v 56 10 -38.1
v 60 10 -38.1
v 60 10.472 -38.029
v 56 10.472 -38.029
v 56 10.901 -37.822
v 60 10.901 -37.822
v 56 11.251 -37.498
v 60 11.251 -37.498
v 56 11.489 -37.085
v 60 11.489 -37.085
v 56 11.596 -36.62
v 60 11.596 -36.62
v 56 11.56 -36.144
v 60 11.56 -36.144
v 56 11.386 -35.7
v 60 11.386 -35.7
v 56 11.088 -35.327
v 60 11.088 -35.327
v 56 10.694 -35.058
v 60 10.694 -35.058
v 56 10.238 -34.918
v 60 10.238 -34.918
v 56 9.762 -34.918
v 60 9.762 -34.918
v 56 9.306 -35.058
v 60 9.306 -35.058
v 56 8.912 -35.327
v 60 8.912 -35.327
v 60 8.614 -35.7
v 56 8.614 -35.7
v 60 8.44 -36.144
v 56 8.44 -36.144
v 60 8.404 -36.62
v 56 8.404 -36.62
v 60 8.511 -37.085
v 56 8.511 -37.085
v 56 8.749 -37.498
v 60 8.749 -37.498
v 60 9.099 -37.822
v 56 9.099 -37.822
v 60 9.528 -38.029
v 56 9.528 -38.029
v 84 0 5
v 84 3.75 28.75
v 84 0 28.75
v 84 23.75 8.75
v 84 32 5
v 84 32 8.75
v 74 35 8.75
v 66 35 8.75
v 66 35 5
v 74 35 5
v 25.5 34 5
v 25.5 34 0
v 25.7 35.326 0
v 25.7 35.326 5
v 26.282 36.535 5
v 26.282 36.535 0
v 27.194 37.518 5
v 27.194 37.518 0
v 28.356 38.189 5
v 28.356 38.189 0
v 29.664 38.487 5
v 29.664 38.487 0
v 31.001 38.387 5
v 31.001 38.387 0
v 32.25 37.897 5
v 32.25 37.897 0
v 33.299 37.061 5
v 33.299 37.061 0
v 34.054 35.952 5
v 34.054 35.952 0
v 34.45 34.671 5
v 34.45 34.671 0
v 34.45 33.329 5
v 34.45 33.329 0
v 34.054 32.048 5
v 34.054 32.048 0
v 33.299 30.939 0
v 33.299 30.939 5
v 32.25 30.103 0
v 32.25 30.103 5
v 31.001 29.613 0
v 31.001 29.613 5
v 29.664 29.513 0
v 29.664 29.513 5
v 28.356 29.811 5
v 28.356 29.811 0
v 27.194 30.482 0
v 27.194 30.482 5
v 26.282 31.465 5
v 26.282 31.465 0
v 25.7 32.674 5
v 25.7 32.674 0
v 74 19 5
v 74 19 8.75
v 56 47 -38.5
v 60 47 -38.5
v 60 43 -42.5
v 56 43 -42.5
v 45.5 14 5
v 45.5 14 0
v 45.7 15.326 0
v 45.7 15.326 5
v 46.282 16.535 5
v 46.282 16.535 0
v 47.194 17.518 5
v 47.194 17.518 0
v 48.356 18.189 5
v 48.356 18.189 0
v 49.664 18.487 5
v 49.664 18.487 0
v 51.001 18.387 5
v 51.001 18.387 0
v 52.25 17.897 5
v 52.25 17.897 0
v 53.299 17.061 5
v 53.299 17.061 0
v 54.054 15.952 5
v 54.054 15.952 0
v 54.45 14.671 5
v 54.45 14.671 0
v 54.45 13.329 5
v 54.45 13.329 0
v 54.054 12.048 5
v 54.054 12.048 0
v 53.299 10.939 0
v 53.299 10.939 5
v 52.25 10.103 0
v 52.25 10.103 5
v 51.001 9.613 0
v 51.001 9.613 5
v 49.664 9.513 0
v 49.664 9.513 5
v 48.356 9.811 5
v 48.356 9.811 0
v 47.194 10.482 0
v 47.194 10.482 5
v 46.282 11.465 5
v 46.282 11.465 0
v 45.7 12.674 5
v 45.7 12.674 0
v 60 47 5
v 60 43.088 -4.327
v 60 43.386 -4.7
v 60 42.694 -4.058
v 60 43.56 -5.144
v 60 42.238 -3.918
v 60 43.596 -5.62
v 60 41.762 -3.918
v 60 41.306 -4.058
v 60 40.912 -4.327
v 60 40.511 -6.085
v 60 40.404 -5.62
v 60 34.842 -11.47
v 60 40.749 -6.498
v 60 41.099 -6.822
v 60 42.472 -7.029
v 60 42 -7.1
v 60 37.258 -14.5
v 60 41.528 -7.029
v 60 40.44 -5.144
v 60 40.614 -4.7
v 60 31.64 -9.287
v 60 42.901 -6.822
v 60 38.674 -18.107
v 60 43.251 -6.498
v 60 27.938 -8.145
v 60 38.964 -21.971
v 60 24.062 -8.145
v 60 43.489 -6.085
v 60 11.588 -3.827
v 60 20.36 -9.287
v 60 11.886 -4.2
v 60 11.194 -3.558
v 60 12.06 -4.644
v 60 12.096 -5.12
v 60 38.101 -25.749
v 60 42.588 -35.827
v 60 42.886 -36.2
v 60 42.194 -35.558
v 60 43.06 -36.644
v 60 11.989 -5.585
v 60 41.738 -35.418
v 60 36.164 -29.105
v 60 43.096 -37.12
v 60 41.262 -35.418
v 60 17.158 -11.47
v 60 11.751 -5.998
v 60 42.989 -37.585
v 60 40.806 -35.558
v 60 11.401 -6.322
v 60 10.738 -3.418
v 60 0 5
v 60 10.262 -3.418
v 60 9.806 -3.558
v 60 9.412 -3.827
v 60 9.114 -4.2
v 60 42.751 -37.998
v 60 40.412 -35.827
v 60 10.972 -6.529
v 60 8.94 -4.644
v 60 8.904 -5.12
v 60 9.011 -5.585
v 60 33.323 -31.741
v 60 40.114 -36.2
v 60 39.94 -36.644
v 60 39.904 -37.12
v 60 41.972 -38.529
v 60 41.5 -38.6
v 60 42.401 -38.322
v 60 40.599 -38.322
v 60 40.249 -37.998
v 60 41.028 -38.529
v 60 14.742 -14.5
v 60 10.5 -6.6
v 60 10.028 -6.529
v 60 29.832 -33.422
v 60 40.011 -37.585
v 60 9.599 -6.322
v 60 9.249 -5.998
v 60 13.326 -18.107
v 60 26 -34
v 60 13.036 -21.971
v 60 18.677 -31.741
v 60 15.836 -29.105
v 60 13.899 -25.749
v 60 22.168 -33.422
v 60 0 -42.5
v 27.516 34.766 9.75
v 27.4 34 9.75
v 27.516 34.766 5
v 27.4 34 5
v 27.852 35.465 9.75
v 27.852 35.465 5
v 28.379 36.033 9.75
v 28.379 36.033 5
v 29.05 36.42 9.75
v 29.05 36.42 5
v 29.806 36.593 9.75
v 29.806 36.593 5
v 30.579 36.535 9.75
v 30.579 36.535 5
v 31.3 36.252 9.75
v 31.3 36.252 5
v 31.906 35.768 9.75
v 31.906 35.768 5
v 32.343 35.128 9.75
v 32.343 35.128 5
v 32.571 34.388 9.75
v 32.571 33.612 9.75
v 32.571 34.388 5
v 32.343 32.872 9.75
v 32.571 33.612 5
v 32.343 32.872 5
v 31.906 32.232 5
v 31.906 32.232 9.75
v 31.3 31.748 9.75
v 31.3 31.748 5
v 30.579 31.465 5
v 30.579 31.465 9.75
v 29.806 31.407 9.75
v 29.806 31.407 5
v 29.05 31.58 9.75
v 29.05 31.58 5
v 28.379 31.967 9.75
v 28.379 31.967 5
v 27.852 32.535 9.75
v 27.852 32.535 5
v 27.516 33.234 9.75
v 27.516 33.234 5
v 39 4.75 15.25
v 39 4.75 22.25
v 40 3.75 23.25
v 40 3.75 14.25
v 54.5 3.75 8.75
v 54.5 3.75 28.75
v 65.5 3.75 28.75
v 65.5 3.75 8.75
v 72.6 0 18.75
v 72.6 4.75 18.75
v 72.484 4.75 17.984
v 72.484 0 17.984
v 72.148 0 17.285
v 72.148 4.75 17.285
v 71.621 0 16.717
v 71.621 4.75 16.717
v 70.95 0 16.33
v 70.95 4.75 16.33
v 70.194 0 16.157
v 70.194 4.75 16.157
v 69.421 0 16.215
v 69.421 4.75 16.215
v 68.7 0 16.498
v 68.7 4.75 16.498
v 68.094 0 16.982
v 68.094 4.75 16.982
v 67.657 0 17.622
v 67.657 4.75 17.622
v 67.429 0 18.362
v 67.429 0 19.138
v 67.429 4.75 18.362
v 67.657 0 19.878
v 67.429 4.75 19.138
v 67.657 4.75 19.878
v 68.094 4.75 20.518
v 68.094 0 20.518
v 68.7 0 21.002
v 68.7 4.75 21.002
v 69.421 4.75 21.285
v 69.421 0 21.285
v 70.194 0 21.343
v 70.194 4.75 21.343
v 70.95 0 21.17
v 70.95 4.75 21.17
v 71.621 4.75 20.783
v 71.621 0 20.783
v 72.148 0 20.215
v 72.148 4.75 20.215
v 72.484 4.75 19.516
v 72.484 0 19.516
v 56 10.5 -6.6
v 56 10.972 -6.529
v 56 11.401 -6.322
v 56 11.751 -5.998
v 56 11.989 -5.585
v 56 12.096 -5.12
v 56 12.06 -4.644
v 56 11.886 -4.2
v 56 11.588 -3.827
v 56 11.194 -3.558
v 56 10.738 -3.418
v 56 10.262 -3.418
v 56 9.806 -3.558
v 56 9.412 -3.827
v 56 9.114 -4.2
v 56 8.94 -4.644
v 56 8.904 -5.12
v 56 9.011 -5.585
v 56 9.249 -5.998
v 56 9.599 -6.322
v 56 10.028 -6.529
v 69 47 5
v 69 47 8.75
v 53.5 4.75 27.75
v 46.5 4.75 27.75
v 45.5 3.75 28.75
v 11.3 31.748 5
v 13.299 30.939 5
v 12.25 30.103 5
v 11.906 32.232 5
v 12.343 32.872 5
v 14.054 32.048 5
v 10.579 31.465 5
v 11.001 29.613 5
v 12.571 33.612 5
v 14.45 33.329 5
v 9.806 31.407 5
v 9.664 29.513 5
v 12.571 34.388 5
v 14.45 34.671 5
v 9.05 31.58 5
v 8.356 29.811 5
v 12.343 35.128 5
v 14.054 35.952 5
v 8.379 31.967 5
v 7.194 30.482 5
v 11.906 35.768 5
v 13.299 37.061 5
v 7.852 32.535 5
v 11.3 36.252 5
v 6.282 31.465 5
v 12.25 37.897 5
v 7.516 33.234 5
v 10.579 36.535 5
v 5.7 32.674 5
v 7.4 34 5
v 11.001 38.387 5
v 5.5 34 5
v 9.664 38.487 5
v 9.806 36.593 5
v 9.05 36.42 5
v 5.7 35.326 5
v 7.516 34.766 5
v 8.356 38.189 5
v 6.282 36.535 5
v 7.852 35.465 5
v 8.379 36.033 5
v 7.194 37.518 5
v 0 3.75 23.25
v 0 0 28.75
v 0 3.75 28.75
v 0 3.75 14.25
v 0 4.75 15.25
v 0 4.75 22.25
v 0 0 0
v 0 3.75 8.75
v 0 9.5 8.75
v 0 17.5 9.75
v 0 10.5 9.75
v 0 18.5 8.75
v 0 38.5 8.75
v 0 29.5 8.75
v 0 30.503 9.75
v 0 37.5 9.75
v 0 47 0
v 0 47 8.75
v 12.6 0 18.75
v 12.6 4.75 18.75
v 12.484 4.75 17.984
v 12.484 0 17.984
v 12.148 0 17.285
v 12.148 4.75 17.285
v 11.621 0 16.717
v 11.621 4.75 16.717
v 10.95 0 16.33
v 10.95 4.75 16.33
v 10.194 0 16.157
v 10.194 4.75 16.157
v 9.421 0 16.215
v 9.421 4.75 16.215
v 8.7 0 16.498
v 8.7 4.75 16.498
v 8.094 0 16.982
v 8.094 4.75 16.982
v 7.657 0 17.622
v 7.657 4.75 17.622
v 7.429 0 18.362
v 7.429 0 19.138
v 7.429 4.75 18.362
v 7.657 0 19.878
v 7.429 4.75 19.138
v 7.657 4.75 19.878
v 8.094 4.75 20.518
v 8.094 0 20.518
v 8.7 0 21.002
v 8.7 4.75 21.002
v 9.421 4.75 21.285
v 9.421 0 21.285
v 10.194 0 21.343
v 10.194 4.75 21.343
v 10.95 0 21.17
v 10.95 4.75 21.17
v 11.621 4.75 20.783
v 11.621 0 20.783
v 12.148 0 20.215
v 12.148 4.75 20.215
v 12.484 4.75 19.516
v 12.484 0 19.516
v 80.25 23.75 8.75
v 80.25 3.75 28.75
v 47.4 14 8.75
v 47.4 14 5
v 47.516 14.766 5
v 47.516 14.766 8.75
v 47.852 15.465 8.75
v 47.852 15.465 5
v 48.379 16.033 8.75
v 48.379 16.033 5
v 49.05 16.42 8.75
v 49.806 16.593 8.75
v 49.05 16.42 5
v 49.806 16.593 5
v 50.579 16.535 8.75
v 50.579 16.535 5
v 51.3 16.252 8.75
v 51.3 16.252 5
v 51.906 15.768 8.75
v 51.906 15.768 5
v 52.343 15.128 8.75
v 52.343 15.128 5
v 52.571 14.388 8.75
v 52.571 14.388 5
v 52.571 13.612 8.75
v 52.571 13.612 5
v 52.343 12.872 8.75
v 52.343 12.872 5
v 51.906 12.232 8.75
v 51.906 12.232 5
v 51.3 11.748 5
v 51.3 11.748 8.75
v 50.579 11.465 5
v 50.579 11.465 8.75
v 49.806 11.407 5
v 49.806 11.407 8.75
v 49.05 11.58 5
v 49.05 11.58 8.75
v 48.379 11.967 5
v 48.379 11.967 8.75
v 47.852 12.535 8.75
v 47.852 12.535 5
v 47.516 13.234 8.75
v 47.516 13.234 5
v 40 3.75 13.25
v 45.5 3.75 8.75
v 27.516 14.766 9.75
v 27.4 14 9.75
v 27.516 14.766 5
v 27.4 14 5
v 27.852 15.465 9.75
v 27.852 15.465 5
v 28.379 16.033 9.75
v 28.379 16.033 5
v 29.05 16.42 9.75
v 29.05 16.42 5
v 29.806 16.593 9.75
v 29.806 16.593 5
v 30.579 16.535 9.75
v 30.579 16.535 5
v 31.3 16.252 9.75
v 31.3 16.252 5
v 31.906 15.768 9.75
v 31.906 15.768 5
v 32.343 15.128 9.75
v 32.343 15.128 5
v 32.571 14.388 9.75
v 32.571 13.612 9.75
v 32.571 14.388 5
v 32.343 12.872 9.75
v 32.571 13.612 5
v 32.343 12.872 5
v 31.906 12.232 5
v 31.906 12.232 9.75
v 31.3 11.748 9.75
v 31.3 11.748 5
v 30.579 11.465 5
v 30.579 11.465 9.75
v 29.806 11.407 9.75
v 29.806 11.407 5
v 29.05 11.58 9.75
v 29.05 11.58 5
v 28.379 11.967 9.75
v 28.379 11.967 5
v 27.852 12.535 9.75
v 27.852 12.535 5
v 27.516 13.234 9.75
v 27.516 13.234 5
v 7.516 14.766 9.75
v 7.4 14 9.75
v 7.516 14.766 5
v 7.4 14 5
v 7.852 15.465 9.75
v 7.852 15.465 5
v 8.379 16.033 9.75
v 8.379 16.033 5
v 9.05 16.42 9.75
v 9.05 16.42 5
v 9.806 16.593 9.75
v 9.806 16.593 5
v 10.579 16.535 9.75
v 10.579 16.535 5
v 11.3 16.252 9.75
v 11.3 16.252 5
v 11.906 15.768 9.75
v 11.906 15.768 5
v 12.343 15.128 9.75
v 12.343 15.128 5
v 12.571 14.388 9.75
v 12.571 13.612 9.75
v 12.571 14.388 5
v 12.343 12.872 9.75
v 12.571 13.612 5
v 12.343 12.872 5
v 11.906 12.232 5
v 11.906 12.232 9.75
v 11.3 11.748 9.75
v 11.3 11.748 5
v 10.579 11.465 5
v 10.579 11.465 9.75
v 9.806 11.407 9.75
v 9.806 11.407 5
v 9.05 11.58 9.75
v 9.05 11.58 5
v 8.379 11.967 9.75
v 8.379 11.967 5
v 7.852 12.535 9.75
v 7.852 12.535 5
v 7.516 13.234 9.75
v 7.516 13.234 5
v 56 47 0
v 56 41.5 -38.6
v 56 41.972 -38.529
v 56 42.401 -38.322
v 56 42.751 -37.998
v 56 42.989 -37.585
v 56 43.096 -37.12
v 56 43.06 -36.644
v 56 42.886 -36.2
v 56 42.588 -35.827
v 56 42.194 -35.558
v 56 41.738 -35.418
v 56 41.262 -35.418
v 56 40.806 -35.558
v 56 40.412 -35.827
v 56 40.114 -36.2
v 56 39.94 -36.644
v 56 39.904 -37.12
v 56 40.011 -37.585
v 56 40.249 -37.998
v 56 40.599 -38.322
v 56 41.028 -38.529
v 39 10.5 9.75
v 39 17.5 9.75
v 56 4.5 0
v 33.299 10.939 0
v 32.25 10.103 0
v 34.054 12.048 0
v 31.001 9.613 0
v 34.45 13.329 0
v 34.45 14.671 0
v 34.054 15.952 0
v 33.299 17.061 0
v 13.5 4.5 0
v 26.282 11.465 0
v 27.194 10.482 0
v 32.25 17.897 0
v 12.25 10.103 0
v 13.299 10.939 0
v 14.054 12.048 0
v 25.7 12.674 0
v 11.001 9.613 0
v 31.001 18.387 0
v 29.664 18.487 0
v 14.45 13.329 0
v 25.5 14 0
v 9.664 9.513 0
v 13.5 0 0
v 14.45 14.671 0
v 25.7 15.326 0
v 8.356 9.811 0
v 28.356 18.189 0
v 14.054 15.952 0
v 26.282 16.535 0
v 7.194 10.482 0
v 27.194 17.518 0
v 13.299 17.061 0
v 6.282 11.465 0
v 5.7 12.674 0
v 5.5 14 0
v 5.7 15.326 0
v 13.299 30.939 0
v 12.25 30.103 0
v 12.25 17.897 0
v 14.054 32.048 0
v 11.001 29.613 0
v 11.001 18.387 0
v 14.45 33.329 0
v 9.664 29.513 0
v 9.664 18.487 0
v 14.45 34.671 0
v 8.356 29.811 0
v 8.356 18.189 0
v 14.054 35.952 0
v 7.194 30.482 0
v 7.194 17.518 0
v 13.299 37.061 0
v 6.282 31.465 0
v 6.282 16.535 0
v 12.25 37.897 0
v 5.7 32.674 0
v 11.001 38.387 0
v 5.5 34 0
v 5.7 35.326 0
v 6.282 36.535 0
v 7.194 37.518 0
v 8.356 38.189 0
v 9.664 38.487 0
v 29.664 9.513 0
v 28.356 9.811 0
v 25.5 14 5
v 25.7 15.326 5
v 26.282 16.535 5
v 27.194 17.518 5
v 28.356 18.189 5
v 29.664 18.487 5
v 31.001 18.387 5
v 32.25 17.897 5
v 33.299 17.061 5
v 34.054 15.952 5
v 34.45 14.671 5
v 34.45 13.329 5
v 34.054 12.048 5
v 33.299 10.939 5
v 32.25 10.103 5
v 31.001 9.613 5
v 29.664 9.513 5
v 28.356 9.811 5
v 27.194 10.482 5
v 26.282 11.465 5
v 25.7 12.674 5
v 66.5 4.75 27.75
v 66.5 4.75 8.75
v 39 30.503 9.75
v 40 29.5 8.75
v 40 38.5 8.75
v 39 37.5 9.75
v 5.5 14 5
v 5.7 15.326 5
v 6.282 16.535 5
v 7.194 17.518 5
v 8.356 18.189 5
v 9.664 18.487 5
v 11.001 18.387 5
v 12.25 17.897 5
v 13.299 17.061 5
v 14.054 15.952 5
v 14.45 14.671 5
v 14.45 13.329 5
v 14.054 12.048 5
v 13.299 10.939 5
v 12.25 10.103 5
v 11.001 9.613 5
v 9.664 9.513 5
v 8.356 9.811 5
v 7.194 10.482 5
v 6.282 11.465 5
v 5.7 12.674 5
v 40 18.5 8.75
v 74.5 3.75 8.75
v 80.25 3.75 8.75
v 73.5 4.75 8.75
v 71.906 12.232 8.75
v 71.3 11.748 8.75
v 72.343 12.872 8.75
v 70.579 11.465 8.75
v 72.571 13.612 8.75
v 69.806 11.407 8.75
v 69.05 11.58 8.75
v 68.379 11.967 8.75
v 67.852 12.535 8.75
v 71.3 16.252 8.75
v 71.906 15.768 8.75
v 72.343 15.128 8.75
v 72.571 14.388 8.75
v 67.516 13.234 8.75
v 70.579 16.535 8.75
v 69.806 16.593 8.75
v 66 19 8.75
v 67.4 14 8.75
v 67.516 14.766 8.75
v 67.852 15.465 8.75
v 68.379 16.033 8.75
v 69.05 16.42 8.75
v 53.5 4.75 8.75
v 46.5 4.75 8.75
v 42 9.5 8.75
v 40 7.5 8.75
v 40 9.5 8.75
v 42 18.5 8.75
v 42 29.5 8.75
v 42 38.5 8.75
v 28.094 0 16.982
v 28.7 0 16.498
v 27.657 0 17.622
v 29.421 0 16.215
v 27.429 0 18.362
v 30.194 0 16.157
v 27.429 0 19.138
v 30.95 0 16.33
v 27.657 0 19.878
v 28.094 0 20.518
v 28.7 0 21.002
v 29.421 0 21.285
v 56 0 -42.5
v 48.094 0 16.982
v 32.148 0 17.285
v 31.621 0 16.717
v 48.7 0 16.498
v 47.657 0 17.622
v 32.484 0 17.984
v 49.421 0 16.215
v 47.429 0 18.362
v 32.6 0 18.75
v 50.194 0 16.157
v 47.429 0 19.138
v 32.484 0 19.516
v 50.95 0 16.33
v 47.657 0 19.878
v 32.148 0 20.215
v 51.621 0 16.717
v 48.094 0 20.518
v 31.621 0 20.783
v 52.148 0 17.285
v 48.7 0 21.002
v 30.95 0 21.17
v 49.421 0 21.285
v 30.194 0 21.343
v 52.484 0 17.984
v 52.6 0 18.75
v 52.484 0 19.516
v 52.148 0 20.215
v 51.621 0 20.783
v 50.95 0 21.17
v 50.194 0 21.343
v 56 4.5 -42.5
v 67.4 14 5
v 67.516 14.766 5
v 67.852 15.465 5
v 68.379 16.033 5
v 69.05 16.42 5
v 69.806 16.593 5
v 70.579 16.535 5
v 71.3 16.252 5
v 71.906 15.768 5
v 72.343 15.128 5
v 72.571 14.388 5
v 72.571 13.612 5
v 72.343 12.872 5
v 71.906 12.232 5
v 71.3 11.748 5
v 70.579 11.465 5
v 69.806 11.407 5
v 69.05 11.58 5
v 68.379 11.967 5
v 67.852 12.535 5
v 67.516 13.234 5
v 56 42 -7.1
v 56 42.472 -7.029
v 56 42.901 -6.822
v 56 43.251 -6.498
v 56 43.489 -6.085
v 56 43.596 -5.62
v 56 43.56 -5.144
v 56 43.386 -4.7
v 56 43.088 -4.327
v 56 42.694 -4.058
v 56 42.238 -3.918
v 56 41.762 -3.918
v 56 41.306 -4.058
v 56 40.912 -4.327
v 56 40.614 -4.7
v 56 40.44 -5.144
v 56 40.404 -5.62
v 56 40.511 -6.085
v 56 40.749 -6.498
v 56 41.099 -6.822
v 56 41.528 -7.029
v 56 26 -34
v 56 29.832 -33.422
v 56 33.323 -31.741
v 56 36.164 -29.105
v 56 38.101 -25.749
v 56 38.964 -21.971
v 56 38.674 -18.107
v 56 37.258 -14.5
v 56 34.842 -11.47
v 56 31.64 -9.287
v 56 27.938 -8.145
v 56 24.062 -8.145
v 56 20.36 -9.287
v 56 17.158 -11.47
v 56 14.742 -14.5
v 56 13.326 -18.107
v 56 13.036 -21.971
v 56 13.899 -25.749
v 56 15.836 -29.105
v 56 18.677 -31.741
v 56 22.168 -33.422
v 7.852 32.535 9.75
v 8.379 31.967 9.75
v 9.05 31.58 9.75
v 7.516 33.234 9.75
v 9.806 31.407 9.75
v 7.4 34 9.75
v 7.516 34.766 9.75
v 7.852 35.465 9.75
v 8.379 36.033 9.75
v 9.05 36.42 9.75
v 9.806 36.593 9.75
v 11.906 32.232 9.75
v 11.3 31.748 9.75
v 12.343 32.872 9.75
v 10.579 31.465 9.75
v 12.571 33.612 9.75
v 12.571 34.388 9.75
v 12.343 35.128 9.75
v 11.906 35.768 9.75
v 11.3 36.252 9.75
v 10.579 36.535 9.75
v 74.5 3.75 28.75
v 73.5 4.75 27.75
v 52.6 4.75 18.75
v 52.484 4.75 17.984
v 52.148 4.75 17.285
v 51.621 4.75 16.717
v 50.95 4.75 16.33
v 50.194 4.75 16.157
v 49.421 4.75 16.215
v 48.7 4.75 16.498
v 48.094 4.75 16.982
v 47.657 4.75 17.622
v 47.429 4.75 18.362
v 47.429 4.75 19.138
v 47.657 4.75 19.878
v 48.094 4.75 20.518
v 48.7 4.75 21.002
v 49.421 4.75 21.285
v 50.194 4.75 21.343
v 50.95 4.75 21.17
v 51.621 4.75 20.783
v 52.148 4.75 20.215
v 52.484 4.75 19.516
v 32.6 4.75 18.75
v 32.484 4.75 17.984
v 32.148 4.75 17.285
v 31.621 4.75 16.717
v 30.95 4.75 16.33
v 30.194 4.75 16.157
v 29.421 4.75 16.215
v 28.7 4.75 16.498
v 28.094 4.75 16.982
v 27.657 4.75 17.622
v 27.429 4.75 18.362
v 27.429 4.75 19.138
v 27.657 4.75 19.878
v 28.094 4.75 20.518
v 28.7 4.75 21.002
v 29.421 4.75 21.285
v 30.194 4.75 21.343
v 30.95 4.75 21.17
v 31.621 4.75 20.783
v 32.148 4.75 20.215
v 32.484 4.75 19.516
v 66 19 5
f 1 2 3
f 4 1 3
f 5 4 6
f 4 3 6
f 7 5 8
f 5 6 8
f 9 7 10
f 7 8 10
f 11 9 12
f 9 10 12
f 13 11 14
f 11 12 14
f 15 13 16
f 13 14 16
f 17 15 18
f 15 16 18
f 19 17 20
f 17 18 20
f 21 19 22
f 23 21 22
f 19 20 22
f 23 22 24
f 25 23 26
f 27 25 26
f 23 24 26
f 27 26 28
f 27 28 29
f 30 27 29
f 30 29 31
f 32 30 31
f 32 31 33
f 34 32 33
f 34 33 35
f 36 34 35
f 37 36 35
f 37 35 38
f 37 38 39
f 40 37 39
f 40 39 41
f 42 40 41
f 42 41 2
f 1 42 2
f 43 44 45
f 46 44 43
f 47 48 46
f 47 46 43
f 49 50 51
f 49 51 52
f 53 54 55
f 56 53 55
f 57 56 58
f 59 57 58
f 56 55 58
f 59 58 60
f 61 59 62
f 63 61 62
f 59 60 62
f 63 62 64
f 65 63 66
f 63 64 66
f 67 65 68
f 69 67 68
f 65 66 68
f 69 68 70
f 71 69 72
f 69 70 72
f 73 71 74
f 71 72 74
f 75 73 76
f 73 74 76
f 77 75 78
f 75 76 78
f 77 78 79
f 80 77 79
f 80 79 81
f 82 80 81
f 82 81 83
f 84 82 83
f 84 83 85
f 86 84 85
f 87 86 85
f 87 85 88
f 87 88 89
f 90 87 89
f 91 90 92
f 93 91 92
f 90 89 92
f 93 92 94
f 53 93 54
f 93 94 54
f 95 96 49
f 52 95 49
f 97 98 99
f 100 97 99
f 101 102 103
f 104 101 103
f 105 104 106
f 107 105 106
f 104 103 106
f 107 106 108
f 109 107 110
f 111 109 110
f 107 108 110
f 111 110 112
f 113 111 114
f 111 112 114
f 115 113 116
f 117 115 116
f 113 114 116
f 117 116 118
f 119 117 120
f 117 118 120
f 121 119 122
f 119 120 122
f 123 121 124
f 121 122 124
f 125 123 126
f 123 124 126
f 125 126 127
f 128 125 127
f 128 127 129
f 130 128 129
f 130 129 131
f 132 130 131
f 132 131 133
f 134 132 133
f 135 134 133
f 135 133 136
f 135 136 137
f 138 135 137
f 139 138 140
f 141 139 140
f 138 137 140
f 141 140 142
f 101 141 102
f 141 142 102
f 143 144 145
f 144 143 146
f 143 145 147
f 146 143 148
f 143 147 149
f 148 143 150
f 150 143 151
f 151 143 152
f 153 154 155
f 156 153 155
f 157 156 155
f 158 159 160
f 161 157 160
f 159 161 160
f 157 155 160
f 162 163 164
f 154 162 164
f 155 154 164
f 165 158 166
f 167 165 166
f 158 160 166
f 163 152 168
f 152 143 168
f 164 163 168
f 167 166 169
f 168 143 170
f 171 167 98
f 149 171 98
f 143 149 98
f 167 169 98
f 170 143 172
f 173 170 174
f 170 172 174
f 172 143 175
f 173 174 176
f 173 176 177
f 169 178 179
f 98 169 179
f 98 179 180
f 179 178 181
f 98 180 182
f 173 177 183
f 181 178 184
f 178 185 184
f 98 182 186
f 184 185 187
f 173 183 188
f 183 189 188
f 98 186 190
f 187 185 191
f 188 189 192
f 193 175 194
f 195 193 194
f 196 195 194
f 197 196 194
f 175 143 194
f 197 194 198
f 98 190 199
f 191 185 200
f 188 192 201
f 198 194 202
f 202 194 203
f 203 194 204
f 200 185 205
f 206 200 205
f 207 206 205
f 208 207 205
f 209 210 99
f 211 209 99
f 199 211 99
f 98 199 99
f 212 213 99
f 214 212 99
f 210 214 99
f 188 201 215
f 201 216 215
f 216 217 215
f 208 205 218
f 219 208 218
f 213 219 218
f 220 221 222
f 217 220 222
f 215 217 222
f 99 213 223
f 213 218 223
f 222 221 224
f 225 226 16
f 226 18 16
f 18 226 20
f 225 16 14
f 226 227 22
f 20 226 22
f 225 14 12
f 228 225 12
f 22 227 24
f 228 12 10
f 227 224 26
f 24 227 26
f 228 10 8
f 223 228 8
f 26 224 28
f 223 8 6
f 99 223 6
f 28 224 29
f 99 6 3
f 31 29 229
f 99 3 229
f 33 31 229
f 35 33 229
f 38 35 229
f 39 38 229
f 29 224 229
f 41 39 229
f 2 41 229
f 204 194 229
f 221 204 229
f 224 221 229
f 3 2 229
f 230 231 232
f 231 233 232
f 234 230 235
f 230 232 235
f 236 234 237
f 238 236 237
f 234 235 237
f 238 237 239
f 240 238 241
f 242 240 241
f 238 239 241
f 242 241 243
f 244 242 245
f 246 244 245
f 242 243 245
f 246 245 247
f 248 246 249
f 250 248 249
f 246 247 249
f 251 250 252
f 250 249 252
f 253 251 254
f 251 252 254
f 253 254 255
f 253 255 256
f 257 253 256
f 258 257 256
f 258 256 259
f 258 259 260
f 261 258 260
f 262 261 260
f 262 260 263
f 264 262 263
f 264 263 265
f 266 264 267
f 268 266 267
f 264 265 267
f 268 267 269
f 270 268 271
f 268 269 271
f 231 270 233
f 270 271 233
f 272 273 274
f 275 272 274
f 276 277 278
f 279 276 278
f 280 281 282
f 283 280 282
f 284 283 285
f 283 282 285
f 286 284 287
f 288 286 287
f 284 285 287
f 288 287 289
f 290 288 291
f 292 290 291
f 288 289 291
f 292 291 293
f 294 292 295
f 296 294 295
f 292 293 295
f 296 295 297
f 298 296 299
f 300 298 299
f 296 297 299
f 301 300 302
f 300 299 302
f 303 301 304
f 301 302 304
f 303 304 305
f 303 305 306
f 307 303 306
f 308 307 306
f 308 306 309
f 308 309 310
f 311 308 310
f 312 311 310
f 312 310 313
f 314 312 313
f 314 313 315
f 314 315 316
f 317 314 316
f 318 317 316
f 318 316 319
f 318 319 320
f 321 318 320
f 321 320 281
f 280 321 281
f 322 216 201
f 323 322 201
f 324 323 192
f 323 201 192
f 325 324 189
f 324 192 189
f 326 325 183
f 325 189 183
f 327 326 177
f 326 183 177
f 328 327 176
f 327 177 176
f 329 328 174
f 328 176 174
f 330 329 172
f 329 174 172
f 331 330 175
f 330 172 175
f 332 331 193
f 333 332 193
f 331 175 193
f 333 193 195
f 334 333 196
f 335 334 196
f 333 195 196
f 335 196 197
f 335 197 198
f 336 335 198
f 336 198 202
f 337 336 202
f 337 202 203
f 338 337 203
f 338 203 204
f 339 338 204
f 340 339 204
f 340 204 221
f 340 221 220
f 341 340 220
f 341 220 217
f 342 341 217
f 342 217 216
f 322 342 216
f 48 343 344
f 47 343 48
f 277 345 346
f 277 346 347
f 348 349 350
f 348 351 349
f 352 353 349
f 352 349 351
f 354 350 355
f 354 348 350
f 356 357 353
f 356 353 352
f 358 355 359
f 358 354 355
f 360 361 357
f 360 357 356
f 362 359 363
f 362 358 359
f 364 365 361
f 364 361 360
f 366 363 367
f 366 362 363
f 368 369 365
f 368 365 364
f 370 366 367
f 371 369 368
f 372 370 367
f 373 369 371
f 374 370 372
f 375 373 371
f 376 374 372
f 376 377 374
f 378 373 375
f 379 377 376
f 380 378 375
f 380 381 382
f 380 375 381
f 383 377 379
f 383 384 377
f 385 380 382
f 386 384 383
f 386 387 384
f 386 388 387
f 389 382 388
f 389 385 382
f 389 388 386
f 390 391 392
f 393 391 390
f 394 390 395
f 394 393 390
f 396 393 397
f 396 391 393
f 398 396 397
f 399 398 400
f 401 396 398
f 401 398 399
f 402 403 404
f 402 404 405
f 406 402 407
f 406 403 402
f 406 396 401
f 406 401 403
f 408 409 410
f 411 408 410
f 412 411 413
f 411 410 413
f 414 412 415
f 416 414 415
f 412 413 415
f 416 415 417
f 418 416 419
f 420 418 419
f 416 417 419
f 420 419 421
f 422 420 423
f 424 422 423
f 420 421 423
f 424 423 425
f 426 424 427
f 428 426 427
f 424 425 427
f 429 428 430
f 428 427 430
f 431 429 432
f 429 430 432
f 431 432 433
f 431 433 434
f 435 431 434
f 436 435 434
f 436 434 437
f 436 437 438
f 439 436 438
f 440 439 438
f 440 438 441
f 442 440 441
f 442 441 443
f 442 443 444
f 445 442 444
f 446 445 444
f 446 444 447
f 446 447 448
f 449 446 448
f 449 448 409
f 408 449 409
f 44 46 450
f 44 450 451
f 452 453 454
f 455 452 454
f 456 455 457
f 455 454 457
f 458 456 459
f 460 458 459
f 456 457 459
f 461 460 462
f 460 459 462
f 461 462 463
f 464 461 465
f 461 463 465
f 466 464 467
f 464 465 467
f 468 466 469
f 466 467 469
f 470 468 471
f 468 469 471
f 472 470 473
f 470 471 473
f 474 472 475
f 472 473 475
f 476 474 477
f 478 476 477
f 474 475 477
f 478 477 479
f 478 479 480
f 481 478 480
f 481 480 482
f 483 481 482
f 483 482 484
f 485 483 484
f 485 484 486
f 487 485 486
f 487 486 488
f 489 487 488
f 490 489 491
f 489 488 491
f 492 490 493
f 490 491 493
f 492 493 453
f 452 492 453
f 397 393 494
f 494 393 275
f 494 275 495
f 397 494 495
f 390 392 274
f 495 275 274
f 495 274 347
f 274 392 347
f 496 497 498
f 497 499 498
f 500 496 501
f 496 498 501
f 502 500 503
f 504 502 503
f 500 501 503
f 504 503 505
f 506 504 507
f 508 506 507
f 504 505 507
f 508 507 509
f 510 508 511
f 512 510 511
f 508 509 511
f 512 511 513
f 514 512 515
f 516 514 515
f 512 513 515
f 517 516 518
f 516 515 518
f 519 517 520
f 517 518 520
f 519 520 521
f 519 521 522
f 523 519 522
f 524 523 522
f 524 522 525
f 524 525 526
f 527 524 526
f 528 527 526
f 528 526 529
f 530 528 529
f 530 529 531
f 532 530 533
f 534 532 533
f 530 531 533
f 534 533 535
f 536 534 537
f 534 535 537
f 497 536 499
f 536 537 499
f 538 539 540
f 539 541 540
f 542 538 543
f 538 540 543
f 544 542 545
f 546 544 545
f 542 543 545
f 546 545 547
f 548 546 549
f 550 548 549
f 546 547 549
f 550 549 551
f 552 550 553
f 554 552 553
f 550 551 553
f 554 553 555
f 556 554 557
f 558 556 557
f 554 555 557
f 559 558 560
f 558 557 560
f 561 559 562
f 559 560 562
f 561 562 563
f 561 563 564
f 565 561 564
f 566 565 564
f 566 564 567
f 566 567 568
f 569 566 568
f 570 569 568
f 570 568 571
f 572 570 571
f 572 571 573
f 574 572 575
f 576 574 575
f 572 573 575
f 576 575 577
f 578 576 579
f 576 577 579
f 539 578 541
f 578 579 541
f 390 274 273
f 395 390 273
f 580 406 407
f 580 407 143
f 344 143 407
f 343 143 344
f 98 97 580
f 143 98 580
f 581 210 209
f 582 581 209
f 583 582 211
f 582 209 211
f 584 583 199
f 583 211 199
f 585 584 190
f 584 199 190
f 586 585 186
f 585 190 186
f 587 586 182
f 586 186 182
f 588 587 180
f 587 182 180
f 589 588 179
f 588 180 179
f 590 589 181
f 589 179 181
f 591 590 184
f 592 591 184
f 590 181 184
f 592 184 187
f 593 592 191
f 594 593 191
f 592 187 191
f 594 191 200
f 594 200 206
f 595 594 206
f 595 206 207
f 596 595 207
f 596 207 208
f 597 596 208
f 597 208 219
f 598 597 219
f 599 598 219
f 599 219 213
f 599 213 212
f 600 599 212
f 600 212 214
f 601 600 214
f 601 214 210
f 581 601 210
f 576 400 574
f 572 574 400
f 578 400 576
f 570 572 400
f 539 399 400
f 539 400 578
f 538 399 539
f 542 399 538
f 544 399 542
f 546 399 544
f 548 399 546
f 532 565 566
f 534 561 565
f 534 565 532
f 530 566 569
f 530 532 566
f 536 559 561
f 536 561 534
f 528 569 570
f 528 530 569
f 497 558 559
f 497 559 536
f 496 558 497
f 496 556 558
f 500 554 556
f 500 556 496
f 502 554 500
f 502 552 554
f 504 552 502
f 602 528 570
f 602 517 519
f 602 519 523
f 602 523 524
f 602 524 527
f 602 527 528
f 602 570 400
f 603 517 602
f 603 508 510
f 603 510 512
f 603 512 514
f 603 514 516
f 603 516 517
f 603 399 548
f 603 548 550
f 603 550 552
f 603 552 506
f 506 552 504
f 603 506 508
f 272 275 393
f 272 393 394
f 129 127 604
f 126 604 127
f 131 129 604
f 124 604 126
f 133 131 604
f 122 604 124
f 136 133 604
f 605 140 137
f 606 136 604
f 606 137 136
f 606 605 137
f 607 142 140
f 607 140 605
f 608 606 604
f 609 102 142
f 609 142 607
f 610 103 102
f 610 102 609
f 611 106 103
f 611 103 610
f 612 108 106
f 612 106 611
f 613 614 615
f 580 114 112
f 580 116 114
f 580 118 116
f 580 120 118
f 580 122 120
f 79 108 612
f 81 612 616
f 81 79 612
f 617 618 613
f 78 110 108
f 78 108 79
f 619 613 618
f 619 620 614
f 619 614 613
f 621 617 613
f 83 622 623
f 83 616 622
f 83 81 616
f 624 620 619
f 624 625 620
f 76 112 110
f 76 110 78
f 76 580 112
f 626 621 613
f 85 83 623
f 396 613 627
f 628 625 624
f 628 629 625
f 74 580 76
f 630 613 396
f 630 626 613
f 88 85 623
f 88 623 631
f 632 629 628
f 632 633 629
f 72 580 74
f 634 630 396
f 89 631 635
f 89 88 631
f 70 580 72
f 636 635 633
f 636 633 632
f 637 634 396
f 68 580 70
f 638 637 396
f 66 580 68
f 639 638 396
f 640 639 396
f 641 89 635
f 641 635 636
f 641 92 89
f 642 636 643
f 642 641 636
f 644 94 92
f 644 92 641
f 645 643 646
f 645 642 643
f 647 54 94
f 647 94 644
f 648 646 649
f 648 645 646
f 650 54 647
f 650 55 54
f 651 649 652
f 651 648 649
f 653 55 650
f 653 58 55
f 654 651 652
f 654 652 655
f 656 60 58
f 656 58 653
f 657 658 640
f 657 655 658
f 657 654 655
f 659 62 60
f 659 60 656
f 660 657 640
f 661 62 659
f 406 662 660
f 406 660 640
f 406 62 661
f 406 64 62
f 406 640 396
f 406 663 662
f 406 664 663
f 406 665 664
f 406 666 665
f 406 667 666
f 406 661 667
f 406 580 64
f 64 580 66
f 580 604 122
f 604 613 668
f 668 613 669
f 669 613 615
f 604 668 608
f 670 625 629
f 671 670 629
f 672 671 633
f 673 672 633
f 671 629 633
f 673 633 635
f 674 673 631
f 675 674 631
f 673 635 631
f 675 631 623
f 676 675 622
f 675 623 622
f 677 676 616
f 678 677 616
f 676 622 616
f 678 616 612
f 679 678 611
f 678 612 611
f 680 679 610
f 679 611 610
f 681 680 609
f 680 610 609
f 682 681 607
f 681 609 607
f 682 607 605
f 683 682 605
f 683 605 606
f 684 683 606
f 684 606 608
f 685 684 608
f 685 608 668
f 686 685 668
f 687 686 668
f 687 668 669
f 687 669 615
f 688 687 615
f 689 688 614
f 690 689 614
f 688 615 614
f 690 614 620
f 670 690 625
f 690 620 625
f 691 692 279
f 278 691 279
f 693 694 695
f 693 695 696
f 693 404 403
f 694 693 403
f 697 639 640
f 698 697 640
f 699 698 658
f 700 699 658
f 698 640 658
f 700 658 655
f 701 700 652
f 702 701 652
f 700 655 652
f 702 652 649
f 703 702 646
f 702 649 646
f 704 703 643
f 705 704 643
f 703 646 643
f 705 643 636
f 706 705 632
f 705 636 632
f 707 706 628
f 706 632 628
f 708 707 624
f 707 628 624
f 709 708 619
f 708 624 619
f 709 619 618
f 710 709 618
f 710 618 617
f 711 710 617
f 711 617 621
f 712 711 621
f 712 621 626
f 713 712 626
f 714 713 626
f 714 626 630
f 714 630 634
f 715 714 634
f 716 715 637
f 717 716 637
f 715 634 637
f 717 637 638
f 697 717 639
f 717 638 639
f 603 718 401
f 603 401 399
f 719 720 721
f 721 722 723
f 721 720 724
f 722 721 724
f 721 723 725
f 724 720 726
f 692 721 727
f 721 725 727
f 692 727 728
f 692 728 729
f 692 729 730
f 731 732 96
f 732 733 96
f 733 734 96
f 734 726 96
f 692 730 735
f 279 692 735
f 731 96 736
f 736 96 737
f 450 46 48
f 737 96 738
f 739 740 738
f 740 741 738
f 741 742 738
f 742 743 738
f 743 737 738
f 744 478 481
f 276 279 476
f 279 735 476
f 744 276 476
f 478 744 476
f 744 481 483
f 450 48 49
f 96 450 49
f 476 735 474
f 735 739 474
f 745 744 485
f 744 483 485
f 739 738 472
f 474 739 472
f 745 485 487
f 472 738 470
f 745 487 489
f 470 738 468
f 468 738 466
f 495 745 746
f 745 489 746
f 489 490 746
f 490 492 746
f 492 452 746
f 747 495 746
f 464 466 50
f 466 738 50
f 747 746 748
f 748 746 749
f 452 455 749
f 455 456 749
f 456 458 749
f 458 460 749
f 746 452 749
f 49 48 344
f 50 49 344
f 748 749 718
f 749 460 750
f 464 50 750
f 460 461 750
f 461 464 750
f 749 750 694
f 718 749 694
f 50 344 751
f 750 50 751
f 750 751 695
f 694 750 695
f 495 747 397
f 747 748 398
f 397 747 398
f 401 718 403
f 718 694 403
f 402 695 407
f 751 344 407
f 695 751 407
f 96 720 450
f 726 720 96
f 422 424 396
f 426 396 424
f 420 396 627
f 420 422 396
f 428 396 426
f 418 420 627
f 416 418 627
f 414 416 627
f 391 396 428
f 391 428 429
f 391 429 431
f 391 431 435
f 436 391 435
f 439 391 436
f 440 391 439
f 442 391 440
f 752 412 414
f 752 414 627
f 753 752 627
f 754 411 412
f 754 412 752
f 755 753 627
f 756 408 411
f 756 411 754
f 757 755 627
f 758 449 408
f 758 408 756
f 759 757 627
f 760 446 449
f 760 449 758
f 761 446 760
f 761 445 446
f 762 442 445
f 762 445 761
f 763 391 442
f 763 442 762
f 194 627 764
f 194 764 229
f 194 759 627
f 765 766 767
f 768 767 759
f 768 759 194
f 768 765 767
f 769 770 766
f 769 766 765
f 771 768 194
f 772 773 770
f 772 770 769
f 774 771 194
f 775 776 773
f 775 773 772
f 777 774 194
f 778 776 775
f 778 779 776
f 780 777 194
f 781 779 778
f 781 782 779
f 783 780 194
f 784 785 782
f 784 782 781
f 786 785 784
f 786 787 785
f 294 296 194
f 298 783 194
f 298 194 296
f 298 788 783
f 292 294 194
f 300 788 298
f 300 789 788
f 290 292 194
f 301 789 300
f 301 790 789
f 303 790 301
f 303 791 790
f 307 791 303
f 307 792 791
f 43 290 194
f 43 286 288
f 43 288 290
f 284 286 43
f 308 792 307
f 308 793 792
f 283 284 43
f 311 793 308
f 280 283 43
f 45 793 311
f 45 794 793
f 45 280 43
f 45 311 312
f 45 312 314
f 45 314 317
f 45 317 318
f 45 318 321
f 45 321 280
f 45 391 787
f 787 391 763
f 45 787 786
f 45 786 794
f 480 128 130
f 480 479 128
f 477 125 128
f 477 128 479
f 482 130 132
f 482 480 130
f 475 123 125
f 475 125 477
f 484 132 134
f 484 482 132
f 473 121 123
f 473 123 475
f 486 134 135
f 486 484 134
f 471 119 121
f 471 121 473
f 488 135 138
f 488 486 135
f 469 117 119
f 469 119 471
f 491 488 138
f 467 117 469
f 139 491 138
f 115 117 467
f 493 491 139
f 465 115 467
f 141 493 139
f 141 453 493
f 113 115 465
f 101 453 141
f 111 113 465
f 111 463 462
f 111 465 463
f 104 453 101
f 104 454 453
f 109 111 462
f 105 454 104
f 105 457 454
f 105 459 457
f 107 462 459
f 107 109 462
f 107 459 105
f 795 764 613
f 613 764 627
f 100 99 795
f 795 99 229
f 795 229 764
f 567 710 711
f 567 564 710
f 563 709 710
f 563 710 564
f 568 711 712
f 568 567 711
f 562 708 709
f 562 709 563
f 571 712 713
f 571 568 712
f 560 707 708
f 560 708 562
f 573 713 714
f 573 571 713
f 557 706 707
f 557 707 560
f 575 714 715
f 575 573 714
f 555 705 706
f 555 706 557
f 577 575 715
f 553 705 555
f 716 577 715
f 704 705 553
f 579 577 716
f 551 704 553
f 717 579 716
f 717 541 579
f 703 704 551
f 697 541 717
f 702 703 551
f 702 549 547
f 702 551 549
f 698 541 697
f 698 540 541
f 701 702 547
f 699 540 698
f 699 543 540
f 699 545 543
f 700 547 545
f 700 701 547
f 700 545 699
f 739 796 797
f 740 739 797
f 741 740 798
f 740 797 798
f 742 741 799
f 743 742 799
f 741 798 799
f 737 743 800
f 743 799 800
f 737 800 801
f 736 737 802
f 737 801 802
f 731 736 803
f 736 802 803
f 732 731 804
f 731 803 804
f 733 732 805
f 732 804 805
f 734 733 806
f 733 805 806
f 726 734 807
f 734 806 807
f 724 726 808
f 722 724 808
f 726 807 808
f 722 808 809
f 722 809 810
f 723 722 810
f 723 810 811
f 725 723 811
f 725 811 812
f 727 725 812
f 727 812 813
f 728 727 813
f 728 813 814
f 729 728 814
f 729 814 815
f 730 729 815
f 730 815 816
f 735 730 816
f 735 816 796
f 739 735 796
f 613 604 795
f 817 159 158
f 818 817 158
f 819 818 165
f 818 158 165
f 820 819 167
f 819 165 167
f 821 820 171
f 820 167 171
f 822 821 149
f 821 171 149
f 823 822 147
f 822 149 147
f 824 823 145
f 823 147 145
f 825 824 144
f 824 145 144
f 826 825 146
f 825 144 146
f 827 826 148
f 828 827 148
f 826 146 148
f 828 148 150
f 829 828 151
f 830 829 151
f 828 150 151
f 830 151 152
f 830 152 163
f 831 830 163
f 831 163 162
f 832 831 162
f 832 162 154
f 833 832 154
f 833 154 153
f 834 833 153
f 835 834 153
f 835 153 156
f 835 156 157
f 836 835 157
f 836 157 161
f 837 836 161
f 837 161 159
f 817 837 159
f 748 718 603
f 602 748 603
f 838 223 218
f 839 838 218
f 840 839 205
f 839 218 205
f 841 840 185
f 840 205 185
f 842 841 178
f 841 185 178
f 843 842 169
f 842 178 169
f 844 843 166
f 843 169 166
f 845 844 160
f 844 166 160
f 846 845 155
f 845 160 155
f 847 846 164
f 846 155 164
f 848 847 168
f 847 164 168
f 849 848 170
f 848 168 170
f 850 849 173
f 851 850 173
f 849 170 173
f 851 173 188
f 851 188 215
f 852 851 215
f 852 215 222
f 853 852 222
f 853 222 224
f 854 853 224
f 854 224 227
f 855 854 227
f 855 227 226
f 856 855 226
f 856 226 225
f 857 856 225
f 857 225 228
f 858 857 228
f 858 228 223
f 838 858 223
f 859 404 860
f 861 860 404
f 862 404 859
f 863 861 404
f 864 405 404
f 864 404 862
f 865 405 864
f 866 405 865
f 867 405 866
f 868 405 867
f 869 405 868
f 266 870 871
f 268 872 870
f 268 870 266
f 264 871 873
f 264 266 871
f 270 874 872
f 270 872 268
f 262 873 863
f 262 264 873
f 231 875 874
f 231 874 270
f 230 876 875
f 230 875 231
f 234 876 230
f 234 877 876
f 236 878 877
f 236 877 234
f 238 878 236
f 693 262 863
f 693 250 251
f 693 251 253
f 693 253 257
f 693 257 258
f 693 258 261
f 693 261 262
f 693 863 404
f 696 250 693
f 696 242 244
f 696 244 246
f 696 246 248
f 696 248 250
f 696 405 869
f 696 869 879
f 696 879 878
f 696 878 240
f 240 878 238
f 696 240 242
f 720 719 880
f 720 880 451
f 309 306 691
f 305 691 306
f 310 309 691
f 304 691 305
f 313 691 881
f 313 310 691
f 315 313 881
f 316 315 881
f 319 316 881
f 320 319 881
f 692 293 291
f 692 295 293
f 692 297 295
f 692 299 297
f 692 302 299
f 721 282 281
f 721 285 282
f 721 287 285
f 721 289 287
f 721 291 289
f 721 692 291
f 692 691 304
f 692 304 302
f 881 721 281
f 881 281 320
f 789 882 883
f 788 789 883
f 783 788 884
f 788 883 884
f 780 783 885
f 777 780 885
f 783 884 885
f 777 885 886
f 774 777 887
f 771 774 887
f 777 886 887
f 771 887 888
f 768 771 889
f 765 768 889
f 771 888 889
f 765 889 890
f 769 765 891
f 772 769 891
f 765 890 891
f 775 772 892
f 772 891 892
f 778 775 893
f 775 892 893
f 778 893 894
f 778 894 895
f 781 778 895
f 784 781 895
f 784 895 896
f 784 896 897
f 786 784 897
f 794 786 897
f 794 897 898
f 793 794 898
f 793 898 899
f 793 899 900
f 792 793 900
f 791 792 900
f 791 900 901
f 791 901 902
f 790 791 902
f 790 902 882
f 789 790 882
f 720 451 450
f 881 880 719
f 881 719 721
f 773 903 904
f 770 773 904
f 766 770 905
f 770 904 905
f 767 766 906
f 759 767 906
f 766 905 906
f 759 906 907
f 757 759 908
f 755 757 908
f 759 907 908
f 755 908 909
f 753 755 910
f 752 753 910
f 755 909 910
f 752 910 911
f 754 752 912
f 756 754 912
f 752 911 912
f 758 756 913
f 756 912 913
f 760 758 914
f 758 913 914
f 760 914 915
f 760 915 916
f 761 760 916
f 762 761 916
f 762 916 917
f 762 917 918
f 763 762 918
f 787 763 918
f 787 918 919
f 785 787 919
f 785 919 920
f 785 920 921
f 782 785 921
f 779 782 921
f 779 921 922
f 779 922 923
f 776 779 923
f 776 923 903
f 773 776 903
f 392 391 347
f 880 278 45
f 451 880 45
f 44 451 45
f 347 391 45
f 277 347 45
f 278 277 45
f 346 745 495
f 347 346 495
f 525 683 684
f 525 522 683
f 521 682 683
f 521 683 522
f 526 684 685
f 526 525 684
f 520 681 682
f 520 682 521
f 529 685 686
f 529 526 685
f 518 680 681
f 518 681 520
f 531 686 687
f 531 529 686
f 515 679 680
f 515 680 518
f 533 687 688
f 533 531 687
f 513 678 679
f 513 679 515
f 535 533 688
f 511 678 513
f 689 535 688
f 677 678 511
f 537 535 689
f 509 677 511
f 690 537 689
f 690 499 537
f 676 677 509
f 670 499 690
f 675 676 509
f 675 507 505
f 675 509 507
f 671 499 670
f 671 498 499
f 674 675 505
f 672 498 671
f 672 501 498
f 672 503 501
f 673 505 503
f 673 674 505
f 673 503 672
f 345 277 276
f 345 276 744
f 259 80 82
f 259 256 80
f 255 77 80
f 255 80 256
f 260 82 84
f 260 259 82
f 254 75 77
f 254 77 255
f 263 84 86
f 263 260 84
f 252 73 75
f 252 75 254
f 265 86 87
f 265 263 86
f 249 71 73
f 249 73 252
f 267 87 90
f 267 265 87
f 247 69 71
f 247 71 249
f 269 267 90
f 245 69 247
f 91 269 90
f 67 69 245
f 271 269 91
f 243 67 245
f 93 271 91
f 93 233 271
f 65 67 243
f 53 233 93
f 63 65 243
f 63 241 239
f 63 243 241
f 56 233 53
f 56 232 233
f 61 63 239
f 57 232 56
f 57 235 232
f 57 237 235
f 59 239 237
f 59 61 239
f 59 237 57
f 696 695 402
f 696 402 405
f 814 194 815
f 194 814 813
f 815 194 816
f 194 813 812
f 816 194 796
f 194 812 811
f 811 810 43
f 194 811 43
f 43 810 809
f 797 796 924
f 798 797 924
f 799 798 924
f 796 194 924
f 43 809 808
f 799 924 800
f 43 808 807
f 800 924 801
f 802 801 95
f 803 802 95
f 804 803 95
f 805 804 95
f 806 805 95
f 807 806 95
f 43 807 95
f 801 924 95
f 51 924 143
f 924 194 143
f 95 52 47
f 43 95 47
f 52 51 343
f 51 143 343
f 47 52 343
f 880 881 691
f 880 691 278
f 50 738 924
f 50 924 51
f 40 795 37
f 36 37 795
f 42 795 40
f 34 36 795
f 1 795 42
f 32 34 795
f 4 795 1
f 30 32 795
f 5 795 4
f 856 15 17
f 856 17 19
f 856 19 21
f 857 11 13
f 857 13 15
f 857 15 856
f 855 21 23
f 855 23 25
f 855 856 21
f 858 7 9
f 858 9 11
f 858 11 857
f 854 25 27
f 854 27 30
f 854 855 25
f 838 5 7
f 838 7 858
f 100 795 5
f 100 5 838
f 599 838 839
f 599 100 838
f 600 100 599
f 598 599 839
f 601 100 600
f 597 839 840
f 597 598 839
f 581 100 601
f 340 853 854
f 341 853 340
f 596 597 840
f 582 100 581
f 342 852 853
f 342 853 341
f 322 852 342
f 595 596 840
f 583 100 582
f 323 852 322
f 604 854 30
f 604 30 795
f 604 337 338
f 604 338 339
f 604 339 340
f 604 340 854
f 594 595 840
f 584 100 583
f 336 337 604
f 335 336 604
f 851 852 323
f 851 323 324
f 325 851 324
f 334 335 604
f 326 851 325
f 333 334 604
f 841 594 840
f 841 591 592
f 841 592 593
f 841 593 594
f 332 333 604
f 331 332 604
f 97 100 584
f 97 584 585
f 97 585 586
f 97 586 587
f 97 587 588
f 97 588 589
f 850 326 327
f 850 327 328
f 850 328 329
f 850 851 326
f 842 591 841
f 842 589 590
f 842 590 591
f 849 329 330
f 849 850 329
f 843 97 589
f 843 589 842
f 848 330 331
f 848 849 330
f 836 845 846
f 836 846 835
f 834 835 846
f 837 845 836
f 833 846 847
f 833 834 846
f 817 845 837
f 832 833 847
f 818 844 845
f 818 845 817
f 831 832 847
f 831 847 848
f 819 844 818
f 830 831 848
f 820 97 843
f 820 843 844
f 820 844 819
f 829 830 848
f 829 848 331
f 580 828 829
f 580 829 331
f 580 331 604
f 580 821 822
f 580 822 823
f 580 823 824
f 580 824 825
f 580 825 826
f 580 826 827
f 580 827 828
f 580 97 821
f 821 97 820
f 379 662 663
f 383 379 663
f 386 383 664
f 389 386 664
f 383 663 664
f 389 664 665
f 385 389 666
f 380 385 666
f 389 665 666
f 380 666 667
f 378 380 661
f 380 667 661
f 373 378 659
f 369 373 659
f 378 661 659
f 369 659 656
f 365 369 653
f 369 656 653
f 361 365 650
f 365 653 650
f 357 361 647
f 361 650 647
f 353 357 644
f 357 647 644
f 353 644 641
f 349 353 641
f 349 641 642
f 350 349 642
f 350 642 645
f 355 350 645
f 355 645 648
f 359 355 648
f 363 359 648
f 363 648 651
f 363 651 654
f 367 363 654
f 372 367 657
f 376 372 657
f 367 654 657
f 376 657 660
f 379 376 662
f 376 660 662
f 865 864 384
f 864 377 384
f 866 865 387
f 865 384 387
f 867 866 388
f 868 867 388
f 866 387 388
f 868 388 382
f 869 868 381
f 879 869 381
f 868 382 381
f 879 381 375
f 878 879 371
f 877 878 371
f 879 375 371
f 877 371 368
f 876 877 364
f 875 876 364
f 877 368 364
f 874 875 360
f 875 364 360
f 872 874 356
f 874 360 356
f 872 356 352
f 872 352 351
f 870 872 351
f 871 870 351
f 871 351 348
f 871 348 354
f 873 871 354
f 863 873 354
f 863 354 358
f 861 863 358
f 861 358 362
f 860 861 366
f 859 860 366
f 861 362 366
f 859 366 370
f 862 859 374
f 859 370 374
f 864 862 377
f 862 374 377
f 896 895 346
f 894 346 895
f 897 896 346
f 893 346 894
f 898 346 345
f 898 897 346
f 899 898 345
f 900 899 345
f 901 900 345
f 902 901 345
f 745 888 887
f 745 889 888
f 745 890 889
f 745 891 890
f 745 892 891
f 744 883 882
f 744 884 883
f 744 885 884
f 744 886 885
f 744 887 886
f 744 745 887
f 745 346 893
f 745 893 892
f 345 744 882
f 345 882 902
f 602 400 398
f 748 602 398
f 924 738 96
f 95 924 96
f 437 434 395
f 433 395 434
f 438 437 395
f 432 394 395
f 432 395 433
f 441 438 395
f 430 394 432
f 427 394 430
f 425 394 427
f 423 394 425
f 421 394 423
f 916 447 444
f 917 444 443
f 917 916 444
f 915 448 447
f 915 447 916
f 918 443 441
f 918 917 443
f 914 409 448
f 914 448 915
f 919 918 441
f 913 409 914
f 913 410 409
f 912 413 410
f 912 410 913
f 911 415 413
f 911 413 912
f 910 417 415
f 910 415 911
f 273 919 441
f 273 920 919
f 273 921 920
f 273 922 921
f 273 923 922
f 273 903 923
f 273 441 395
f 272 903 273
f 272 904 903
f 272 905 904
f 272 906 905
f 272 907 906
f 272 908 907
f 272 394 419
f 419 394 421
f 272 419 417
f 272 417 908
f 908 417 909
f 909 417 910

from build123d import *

# Parameters (mm, degrees)
BOSS_EXTRUDE1_DEPTH = 8.75
SKETCH3_W           = 8
SKETCH3_H           = 16
CUT_EXTRUDE1_DEPTH  = 8.75
SKETCH4_W           = 84
SKETCH4_H           = 20
BOSS_EXTRUDE2_DEPTH = 3.75
BOSS_EXTRUDE3_DEPTH = 4.5
BOSS_EXTRUDE5_DEPTH = 4
SKETCH7_R           = 2.6
CUT_EXTRUDE2_DEPTH  = 14
CUT_EXTRUDE3_DEPTH  = 5
SKETCH10_R          = 1.6
SKETCH10_R_2        = 13
CUT_EXTRUDE4_DEPTH  = 5
SKETCH11_R          = 4.5
CUT_EXTRUDE5_DEPTH  = 5
SKETCH12_R          = 2.6
CUT_EXTRUDE6_DEPTH  = 3.75
SKETCH13_W          = 40
SKETCH13_H          = 9
BOSS_EXTRUDE6_DEPTH = 1
CUT_EXTRUDE14_DEPTH = 31
CUT_EXTRUDE15_DEPTH = 42
SKETCH17_W          = 40
SKETCH17_H          = 9
BOSS_EXTRUDE7_DEPTH = 1
CUT_EXTRUDE16_DEPTH = 10
CUT_EXTRUDE17_DEPTH = 40
SKETCH20_W          = 9
SKETCH20_H          = 20
BOSS_EXTRUDE8_DEPTH = 1
CUT_EXTRUDE19_DEPTH = 20
CUT_EXTRUDE20_DEPTH = 30
SKETCH23_R          = 2.6
CUT_EXTRUDE21_DEPTH = 1
SKETCH24_R          = 2.6
CUT_EXTRUDE22_DEPTH = 12
BOSS_EXTRUDE9_DEPTH = 3.75


with BuildPart() as part:
    # Sketch1 → Boss-Extrude1 (new body)
    with BuildSketch(Plane.XY):
        Polygon((0, 0), (0, 47), (69, 47), (84, 32), (84, 0), align=None)
    extrude(amount=BOSS_EXTRUDE1_DEPTH)

    # Sketch3 → Cut-Extrude1 (cut)
    with BuildSketch(Plane.XY.offset(8.75)):
        with Locations((70, 27)):
            Rectangle(SKETCH3_W, SKETCH3_H)
    extrude(amount=-CUT_EXTRUDE1_DEPTH, mode=Mode.SUBTRACT)

    # Sketch4 → Boss-Extrude2 (add)
    with BuildSketch(Plane.XZ):
        with Locations((42, 18.75)):
            Rectangle(SKETCH4_W, SKETCH4_H)
    extrude(amount=-BOSS_EXTRUDE2_DEPTH)

    # Sketch5 → Boss-Extrude3 (add)
    with BuildSketch(Plane.XZ):
        Polygon((60, -42.5), (56, -42.5), (13.5, 0), (60, 0), align=None)
    extrude(amount=-BOSS_EXTRUDE3_DEPTH)

    # Sketch6 → Boss-Extrude5 (add)
    with BuildSketch(Plane(origin=(60, 0, 0), x_dir=(0, 0, -1), z_dir=(1, 0, 0))):
        Polygon((0, 0), (0, 47), (38.5, 47), (42.5, 43), (42.5, 0), align=None)
    extrude(amount=-BOSS_EXTRUDE5_DEPTH)

    # Sketch7 → Cut-Extrude2 (cut)
    with BuildSketch(Plane(origin=(0, 0, 0), x_dir=(-1, 0, 0), z_dir=(0, 0, -1))):
        with Locations((-70, 14)):
            Circle(SKETCH7_R)
    extrude(amount=-CUT_EXTRUDE2_DEPTH, mode=Mode.SUBTRACT)

    # Sketch9 → Cut-Extrude3 (cut)
    with BuildSketch(Plane(origin=(0, 0, 0), x_dir=(-1, 0, 0), z_dir=(0, 0, -1))):
        Polygon((-84, 0), (-84, 32), (-69, 47), (-60, 47), (-60, 0), align=None)
    extrude(amount=-CUT_EXTRUDE3_DEPTH, mode=Mode.SUBTRACT)

    # Sketch10 → Cut-Extrude4 (cut)
    with BuildSketch(Plane(origin=(60, 0, 0), x_dir=(0, 0, -1), z_dir=(1, 0, 0))):
        with Locations((5.5, 42)):
            Circle(SKETCH10_R)
        with Locations((21, 26)):
            Circle(SKETCH10_R_2)
        with Locations((37, 41.5)):
            Circle(SKETCH10_R)
        with Locations((36.5, 10)):
            Circle(SKETCH10_R)
        with Locations((5, 10.5)):
            Circle(SKETCH10_R)
    extrude(amount=-CUT_EXTRUDE4_DEPTH, mode=Mode.SUBTRACT)

    # Sketch11 → Cut-Extrude5 (cut)
    with BuildSketch(Plane(origin=(0, 0, 0), x_dir=(-1, 0, 0), z_dir=(0, 0, -1))):
        with Locations((-50, 14)):
            Circle(SKETCH11_R)
        with Locations((-30, 14)):
            Circle(SKETCH11_R)
        with Locations((-10, 14)):
            Circle(SKETCH11_R)
        with Locations((-10, 34)):
            Circle(SKETCH11_R)
        with Locations((-30, 34)):
            Circle(SKETCH11_R)
    extrude(amount=-CUT_EXTRUDE5_DEPTH, mode=Mode.SUBTRACT)

    # Sketch12 → Cut-Extrude6 (cut)
    with BuildSketch(Plane(origin=(0, 0, 5), x_dir=(-1, 0, 0), z_dir=(0, 0, -1))):
        with Locations((-30, 34)):
            Circle(SKETCH12_R)
        with Locations((-10, 34)):
            Circle(SKETCH12_R)
        with Locations((-10, 14)):
            Circle(SKETCH12_R)
        with Locations((-30, 14)):
            Circle(SKETCH12_R)
        with Locations((-50, 14)):
            Circle(SKETCH12_R)
    extrude(amount=-CUT_EXTRUDE6_DEPTH, mode=Mode.SUBTRACT)

    # Sketch13 → Boss-Extrude6 (add)
    with BuildSketch(Plane.XY.offset(8.75)):
        with Locations((20, 34)):
            Rectangle(SKETCH13_W, SKETCH13_H)
        with Locations((20, 14)):
            Rectangle(SKETCH13_W, SKETCH13_H)
    extrude(amount=BOSS_EXTRUDE6_DEPTH)

    # Sketch16 → Cut-Extrude14 (cut)
    with BuildSketch(Plane(origin=(0, 38.5, 0), x_dir=(1, 0, 0), z_dir=(0, 1, 0))):
        Polygon((40, -8.75), (39, -9.75), (40, -9.75), align=None)
    extrude(amount=-CUT_EXTRUDE14_DEPTH, mode=Mode.SUBTRACT)

    # Sketch14 → Cut-Extrude15 (cut)
    with BuildSketch(Plane.ZY):
        Polygon((8.75, 38.5), (9.75, 37.5), (9.75, 38.5), align=None)
        Polygon((9.75, 29.5), (9.75, 30.502721412), (8.75, 29.5), align=None)
        Polygon((9.75, 18.5), (8.75, 18.5), (9.75, 17.5), align=None)
        Polygon((9.75, 9.5), (9.75, 10.5), (8.75, 9.5), align=None)
    extrude(amount=-CUT_EXTRUDE15_DEPTH, mode=Mode.SUBTRACT)

    # Sketch17 → Boss-Extrude7 (add)
    with BuildSketch(Plane(origin=(0, 3.75, 0), x_dir=(1, 0, 0), z_dir=(0, 1, 0))):
        with Locations((20, -18.75)):
            Rectangle(SKETCH17_W, SKETCH17_H)
    extrude(amount=BOSS_EXTRUDE7_DEPTH)

    # Sketch18 → Cut-Extrude16 (cut)
    with BuildSketch(Plane.XY.offset(23.25)):
        Polygon((40, 4.75), (39, 4.75), (40, 3.75), align=None)
    extrude(amount=-CUT_EXTRUDE16_DEPTH, mode=Mode.SUBTRACT)

    # Sketch19 → Cut-Extrude17 (cut)
    with BuildSketch(Plane.ZY):
        Polygon((14.25, 4.75), (14.25, 3.75), (15.25, 4.75), align=None)
        Polygon((23.25, 4.75), (23.25, 3.75), (22.25, 4.75), align=None)
    extrude(amount=-CUT_EXTRUDE17_DEPTH, mode=Mode.SUBTRACT)

    # Sketch20 → Boss-Extrude8 (add)
    with BuildSketch(Plane(origin=(0, 3.75, 0), x_dir=(1, 0, 0), z_dir=(0, 1, 0))):
        with Locations((50, -18.75)):
            Rectangle(SKETCH20_W, SKETCH20_H)
        with Locations((70, -18.75)):
            Rectangle(SKETCH20_W, SKETCH20_H)
    extrude(amount=BOSS_EXTRUDE8_DEPTH)

    # Sketch22 → Cut-Extrude19 (cut)
    with BuildSketch(Plane.XY.offset(28.75)):
        Polygon((45.5, 3.75), (45.5, 4.75), (46.5, 4.75), align=None)
        Polygon((54.5, 4.75), (54.5, 3.75), (53.5, 4.75), align=None)
        Polygon((65.5, 4.75), (66.5, 4.75), (65.5, 3.75), align=None)
        Polygon((74.5, 4.75), (74.5, 3.75), (73.5, 4.75), align=None)
    extrude(amount=-CUT_EXTRUDE19_DEPTH, mode=Mode.SUBTRACT)

    # Sketch21 → Cut-Extrude20 (cut)
    with BuildSketch(Plane.ZY.offset(-45.5)):
        Polygon((28.75, 3.75), (28.75, 4.75), (27.75, 4.75), align=None)
    extrude(amount=-CUT_EXTRUDE20_DEPTH, mode=Mode.SUBTRACT)

    # Sketch23 → Cut-Extrude21 (cut)
    with BuildSketch(Plane(origin=(0, 0, 8.75), x_dir=(-1, 0, 0), z_dir=(0, 0, -1))):
        with Locations((-30, 34)):
            Circle(SKETCH23_R)
        with Locations((-10, 34)):
            Circle(SKETCH23_R)
        with Locations((-30, 14)):
            Circle(SKETCH23_R)
        with Locations((-10, 14)):
            Circle(SKETCH23_R)
    extrude(amount=-CUT_EXTRUDE21_DEPTH, mode=Mode.SUBTRACT)

    # Sketch24 → Cut-Extrude22 (cut)
    with BuildSketch(Plane(origin=(0, 4.75, 0), x_dir=(1, 0, 0), z_dir=(0, 1, 0))):
        with Locations((10, -18.75)):
            Circle(SKETCH24_R)
        with Locations((30, -18.75)):
            Circle(SKETCH24_R)
        with Locations((50, -18.75)):
            Circle(SKETCH24_R)
        with Locations((70, -18.75)):
            Circle(SKETCH24_R)
    extrude(amount=-CUT_EXTRUDE22_DEPTH, mode=Mode.SUBTRACT)

    # Sketch25 → Boss-Extrude9 (add)
    with BuildSketch(Plane(origin=(84, 0, 0), x_dir=(0, 0, -1), z_dir=(1, 0, 0))):
        Polygon((-8.75, 23.75), (-28.75, 3.75), (-8.75, 3.75), align=None)
    extrude(amount=-BOSS_EXTRUDE9_DEPTH)


solid = part.part
